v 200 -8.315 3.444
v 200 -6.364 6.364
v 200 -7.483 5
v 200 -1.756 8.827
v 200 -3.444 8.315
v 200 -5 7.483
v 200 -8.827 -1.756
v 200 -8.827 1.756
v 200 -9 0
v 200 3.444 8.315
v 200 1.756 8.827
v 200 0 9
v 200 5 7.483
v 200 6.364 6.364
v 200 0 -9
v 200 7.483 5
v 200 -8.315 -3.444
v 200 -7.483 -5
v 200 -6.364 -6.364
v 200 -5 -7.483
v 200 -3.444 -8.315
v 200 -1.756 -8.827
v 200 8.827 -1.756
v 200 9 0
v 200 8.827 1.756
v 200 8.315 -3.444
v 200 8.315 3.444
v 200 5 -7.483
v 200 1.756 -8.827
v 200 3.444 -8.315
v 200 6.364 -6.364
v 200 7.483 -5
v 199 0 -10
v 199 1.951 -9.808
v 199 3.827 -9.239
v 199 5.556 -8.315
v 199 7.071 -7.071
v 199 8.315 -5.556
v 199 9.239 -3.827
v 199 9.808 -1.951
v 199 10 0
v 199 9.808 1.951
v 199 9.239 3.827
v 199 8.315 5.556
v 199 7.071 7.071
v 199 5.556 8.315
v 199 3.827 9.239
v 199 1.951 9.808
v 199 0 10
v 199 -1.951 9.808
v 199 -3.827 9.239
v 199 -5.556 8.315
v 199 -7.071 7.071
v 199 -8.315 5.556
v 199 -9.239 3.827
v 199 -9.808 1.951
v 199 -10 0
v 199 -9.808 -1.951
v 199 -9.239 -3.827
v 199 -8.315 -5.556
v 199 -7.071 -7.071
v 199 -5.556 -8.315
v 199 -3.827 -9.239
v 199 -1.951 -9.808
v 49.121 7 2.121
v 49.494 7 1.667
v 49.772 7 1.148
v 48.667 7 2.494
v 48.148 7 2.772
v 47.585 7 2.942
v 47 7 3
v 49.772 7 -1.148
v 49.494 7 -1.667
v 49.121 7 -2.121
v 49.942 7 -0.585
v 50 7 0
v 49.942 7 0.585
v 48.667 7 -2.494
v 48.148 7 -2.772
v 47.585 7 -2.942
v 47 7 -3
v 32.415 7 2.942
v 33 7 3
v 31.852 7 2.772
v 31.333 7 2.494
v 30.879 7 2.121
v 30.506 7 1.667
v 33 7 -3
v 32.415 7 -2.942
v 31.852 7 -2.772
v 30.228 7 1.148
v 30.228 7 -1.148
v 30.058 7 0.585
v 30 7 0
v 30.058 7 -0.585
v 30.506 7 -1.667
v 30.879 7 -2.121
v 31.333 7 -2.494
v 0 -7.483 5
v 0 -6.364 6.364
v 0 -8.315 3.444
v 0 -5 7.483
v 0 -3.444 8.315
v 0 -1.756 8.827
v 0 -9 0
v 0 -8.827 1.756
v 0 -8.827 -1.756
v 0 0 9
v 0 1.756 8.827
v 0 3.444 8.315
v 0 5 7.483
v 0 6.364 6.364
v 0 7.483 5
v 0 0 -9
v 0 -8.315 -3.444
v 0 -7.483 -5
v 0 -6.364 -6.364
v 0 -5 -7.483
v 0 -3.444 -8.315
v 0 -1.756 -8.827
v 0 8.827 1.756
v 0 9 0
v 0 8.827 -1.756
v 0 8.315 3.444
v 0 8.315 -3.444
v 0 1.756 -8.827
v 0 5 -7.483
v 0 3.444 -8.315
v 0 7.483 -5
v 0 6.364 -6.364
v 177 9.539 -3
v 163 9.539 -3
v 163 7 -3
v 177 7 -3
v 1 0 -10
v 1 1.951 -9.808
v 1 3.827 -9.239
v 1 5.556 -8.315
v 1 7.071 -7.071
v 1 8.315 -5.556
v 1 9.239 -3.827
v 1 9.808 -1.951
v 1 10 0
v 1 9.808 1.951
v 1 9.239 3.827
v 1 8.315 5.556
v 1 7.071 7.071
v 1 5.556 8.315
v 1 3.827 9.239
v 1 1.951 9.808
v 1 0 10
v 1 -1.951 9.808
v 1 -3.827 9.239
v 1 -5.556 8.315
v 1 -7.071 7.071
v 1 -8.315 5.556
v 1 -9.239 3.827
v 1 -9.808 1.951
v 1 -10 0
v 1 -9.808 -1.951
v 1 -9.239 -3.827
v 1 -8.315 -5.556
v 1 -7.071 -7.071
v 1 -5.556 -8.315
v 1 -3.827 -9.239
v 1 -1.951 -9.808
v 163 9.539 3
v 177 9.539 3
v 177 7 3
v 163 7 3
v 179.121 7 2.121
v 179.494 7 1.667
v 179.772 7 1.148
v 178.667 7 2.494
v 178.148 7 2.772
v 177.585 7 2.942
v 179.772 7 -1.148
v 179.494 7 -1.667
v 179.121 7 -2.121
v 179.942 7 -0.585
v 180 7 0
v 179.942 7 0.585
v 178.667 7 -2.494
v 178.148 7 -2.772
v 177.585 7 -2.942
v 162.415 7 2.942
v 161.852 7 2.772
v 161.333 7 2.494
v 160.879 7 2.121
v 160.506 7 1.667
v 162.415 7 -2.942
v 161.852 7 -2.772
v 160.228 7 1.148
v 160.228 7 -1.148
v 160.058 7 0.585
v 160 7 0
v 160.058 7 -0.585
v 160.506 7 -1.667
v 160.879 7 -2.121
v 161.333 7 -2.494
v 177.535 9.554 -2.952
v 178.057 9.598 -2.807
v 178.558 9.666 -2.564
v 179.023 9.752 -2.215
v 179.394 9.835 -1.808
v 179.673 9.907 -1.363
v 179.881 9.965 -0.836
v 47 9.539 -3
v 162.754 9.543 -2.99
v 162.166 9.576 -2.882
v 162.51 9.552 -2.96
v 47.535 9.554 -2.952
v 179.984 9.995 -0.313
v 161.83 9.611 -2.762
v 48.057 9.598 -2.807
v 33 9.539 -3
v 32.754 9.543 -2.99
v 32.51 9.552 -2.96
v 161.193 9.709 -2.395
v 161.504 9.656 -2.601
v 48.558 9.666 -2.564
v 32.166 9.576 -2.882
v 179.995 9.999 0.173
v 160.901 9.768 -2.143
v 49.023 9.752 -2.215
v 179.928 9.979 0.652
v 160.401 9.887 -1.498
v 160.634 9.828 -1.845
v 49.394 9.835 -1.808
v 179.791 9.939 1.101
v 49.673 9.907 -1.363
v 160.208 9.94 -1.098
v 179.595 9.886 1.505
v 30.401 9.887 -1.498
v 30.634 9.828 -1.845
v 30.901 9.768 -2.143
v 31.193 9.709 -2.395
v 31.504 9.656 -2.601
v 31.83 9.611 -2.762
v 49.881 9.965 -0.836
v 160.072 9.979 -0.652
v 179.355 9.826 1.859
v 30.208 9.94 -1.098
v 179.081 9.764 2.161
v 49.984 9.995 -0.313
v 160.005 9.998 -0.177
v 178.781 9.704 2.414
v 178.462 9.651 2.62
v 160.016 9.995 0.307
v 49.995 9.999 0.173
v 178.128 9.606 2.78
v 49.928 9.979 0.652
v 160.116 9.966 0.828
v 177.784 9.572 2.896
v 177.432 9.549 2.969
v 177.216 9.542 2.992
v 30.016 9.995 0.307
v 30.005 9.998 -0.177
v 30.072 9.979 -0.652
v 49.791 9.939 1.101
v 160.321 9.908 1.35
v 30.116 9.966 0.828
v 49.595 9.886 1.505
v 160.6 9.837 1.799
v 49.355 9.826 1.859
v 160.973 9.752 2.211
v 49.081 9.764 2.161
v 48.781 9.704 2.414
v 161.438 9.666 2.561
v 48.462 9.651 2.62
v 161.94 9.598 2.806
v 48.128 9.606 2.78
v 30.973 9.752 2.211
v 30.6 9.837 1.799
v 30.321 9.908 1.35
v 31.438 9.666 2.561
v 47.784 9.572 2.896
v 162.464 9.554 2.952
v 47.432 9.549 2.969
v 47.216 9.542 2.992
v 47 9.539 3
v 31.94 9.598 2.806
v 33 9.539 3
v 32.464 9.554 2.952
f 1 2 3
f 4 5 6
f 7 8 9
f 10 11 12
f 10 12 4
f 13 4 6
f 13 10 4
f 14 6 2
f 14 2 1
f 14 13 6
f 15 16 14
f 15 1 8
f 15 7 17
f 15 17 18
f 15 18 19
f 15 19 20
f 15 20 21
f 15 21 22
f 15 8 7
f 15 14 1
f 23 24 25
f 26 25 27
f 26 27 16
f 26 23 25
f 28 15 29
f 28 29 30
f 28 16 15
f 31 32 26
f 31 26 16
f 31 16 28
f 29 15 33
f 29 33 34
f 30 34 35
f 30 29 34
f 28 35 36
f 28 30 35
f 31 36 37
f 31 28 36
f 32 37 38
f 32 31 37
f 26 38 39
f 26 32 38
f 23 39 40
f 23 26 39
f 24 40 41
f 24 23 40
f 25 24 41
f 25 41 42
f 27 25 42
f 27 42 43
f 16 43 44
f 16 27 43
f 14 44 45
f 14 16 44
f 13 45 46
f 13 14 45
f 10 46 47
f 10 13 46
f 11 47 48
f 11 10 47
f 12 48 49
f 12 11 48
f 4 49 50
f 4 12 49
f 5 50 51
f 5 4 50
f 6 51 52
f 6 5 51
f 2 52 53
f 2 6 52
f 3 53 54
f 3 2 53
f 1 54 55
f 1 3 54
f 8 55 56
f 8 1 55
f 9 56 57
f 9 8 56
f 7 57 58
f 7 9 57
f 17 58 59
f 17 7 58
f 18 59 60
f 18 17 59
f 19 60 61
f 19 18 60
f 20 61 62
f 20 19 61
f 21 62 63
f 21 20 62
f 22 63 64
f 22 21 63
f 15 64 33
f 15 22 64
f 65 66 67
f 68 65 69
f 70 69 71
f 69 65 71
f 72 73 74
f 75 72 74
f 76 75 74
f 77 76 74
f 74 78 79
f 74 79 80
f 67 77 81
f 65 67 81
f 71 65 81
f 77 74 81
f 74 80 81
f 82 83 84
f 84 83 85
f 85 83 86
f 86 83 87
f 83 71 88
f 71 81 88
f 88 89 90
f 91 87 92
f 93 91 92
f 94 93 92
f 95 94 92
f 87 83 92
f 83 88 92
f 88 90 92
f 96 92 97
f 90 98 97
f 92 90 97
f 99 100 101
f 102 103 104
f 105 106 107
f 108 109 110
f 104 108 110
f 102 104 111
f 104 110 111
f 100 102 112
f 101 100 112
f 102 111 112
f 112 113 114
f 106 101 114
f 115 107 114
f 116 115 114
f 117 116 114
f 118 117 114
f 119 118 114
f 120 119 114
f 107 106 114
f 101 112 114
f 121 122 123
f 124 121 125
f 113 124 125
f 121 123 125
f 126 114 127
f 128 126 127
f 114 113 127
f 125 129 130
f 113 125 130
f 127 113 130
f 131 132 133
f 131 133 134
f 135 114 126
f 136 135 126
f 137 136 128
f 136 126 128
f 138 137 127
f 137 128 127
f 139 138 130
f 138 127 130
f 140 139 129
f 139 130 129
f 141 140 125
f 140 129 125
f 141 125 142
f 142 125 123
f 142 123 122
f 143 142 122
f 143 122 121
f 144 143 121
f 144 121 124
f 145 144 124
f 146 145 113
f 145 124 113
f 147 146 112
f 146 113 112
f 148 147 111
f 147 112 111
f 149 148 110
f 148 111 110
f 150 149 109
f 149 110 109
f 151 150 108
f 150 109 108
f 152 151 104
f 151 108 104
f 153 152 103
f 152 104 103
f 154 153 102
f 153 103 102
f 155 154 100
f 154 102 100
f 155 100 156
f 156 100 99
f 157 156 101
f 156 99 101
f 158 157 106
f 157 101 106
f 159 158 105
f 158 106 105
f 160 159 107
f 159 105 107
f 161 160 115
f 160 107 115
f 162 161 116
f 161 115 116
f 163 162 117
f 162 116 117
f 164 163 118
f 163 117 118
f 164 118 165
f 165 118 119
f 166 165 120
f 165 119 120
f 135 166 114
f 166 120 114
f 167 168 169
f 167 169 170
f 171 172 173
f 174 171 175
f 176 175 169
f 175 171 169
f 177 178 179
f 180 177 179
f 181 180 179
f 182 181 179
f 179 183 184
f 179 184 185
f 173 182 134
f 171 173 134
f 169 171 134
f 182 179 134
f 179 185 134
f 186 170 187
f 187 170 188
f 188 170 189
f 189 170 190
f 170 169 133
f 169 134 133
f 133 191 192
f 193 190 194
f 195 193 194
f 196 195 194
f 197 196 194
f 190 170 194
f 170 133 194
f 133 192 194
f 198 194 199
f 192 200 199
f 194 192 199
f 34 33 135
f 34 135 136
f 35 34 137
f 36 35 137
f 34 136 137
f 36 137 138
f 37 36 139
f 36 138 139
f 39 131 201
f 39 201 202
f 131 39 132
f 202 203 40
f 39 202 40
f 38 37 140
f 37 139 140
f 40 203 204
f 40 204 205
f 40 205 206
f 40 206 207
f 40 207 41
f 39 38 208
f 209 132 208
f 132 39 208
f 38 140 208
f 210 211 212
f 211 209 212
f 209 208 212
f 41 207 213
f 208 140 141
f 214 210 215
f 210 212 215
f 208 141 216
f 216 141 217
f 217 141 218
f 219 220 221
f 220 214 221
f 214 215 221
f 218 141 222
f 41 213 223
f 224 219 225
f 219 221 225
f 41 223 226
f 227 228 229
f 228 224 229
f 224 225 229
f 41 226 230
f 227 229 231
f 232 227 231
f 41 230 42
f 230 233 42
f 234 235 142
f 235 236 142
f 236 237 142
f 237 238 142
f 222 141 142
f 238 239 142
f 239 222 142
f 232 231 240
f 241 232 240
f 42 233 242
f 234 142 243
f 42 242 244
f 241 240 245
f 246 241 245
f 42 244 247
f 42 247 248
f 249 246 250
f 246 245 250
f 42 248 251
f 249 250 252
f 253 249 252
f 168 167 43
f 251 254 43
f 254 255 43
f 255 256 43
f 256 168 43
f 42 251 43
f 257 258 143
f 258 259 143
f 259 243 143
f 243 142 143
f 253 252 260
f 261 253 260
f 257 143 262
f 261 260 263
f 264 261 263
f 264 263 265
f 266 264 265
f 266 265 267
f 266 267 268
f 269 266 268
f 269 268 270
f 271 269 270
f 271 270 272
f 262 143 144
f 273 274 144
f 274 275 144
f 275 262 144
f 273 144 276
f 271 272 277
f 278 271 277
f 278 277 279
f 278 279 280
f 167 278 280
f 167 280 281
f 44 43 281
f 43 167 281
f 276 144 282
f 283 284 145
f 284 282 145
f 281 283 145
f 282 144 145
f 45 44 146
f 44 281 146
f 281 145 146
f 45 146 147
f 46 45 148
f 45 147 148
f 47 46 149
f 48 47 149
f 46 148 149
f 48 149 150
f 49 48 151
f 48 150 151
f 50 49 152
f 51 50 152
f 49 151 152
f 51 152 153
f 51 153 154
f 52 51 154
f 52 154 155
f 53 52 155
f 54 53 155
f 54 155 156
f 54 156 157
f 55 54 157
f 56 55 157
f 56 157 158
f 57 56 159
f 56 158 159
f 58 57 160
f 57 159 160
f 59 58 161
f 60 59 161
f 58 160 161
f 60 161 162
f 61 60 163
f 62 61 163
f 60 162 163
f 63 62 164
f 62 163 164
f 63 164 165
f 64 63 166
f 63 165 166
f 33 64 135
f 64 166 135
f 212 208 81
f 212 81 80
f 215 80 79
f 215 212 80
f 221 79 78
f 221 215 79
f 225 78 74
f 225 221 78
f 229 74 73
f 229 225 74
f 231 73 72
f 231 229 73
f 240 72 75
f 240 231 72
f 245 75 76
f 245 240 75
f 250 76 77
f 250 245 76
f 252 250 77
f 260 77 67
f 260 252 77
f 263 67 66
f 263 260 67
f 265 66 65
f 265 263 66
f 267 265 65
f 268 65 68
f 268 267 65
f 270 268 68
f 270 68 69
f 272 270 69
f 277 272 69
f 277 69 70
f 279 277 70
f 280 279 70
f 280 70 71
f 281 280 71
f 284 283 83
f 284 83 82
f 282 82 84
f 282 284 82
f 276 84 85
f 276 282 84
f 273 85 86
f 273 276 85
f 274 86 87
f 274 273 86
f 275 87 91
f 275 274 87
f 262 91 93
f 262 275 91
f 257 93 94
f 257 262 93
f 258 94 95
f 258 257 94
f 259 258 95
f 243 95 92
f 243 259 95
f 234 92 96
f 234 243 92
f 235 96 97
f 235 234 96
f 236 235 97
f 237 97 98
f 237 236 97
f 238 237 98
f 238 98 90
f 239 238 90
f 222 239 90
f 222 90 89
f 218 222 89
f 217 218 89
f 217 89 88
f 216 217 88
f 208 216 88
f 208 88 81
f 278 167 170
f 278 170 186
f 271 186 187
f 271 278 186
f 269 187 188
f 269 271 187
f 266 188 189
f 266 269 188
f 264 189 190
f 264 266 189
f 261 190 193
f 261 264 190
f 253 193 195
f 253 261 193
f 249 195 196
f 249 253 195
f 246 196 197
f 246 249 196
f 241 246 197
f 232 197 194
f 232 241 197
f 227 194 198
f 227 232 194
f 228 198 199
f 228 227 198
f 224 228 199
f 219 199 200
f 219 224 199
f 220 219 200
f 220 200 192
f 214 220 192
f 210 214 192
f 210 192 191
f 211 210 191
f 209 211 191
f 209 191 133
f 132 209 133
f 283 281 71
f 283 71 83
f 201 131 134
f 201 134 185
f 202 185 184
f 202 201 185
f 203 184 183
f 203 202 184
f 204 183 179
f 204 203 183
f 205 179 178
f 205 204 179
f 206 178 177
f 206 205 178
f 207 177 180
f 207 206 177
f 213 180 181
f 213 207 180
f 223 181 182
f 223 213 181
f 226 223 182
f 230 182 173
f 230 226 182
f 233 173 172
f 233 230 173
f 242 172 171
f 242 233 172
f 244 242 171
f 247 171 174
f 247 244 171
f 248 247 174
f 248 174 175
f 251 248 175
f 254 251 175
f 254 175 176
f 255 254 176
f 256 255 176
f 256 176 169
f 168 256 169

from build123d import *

# Parameters (mm, degrees)
SKETCH_1_R             = 10
EXTRUDE_1_DEPTH        = 200
CUT_EXTRUDE_1_DEPTH    = 3
CHAMFER_1_SIZE         = 1
PATTERN_LINEAR_1_COUNT = 3
PATTERN_LINEAR_1_PITCH = 130
CHAMFER_2_SIZE         = 1


with BuildPart() as part:
    # 草图1 → 凸台-拉伸1 (new body)
    with BuildSketch(Plane(origin=(0, 0, 0), x_dir=(0, 0, -1), z_dir=(1, 0, 0))):
        Circle(SKETCH_1_R)
    extrude(amount=EXTRUDE_1_DEPTH)

    # 草图2 → 切除-拉伸1 (cut)
    with BuildSketch(Plane(origin=(0, 10, 0), x_dir=(1, 0, 0), z_dir=(0, 1, 0))):
        with BuildLine():
            Line((33, 3), (47, 3))
            ThreePointArc((47, 3), (50, 0), (47, -3))
            Line((47, -3), (33, -3))
            ThreePointArc((33, -3), (30, 0), (33, 3))
        make_face()
    cut_extrude_1 = extrude(amount=-CUT_EXTRUDE_1_DEPTH, mode=Mode.SUBTRACT)

    # 倒角1
    chamfer_1_edges = [part.edges().sort_by_distance(p)[0] for p in [
        (0, 0, 10),
    ]]
    chamfer(chamfer_1_edges, length=CHAMFER_1_SIZE)

    # 阵列(线性)1: 切除-拉伸1 ×3
    with Locations(*[(i * PATTERN_LINEAR_1_PITCH, 0, 0) for i in range(1, PATTERN_LINEAR_1_COUNT)]):
        add(cut_extrude_1, mode=Mode.SUBTRACT)

    # 倒角2
    chamfer_2_edges = [part.edges().sort_by_distance(p)[0] for p in [
        (200, 0, 10),
    ]]
    chamfer(chamfer_2_edges, length=CHAMFER_2_SIZE)


solid = part.part
